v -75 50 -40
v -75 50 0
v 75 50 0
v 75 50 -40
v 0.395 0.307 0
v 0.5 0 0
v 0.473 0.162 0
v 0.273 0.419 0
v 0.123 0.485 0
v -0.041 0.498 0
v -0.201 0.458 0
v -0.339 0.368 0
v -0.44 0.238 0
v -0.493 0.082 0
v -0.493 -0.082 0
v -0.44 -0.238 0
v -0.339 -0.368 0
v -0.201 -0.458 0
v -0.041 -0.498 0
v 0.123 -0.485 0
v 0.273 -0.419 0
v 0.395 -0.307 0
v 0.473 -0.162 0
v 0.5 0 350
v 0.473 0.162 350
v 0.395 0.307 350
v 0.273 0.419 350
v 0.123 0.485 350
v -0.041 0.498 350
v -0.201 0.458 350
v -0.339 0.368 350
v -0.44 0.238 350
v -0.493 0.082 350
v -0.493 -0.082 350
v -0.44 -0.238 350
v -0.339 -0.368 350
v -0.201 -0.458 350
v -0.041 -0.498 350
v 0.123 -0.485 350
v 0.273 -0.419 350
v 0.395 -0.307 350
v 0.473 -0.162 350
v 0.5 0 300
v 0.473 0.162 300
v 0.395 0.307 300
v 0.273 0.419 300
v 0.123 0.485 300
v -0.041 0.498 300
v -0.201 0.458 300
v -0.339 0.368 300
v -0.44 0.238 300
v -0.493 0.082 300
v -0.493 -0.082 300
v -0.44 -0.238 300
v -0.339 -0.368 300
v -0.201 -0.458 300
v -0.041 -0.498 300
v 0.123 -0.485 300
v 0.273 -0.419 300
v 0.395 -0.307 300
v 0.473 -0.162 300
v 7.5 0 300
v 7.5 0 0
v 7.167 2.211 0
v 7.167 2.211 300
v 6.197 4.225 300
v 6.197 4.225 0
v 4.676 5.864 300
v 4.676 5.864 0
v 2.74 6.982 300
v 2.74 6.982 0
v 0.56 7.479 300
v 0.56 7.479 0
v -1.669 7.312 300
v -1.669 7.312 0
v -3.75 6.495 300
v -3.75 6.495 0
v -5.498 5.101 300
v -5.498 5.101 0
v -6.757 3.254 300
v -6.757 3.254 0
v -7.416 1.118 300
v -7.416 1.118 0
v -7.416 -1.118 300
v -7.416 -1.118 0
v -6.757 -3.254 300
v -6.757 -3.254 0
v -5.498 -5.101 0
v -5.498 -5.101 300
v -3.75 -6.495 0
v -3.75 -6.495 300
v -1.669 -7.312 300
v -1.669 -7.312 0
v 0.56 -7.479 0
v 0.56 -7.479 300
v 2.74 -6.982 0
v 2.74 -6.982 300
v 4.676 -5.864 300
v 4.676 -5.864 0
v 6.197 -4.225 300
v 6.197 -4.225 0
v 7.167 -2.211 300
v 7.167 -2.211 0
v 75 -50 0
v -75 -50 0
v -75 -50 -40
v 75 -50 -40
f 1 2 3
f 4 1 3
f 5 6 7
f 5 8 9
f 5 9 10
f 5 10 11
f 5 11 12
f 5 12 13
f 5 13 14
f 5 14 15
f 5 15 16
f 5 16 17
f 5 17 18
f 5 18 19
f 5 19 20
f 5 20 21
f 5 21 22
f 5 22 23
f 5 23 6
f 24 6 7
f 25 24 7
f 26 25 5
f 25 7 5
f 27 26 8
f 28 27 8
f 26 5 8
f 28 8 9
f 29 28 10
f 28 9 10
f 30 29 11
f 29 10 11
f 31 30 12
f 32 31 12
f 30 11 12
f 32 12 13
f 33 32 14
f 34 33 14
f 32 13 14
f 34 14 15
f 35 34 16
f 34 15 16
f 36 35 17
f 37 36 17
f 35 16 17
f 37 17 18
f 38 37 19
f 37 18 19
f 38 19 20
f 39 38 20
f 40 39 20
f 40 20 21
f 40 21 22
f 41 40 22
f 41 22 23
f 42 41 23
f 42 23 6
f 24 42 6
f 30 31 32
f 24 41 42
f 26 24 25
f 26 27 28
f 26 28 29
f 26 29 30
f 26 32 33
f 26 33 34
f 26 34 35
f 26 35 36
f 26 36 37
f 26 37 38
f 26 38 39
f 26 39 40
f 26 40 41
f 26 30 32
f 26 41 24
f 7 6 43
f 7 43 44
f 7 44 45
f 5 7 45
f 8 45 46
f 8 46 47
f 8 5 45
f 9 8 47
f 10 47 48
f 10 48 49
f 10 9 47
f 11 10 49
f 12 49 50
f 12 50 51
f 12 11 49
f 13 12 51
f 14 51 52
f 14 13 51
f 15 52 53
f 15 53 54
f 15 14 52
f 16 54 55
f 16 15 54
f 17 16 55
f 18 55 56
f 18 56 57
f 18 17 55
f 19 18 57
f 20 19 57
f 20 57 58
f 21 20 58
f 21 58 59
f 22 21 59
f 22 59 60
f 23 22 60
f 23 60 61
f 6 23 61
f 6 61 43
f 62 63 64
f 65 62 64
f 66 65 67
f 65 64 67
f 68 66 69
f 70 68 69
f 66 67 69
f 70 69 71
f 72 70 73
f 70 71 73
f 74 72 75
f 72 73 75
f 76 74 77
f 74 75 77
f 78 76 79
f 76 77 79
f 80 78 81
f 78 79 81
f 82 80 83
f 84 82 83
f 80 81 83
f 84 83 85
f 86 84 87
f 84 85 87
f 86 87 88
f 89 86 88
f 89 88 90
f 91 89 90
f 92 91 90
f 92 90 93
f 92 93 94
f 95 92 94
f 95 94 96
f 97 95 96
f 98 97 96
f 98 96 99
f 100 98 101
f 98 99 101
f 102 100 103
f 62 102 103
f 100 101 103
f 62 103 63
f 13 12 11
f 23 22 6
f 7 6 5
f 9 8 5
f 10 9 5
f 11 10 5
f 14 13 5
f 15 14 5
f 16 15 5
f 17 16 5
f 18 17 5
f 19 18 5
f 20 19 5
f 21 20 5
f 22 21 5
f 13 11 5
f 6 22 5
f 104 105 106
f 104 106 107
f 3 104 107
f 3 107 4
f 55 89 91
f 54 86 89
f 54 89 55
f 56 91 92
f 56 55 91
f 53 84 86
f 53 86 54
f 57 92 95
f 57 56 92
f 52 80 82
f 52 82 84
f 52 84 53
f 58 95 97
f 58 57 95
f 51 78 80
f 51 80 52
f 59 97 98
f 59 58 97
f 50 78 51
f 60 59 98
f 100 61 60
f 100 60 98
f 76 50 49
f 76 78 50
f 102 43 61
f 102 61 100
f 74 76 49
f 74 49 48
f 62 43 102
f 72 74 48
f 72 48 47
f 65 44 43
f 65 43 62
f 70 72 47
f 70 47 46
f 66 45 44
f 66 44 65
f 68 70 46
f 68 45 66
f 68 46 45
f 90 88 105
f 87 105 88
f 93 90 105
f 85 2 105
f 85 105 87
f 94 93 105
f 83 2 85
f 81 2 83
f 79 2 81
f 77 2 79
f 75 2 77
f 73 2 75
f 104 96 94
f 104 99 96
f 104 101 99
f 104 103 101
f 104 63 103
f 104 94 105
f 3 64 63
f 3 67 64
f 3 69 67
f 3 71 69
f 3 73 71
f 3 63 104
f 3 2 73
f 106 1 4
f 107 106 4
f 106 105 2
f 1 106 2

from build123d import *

# Parameters (mm, degrees)
F0_W     = 150
F0_H     = 100
F1_DEPTH = 40
F2_R     = 0.5
F3_DEPTH = 350
F2_R_2   = 7.5
F4_DEPTH = 300


with BuildPart() as f1:
    # F0 (on Top) → F1 (new body)
    with BuildSketch(Plane.XY):
        Rectangle(F0_W, F0_H)
    extrude(amount=-F1_DEPTH)

    # F2 (on Top) → F4 (join)
    with BuildSketch(Plane.XY):
        Circle(F2_R_2)
        Circle(F2_R, mode=Mode.SUBTRACT)
    extrude(amount=F4_DEPTH)


with BuildPart() as f3:
    # F2 (on Top) → F3 (new body)
    with BuildSketch(Plane.XY):
        Circle(F2_R)
    extrude(amount=F3_DEPTH)


solid = Compound([f1.part, f3.part])
